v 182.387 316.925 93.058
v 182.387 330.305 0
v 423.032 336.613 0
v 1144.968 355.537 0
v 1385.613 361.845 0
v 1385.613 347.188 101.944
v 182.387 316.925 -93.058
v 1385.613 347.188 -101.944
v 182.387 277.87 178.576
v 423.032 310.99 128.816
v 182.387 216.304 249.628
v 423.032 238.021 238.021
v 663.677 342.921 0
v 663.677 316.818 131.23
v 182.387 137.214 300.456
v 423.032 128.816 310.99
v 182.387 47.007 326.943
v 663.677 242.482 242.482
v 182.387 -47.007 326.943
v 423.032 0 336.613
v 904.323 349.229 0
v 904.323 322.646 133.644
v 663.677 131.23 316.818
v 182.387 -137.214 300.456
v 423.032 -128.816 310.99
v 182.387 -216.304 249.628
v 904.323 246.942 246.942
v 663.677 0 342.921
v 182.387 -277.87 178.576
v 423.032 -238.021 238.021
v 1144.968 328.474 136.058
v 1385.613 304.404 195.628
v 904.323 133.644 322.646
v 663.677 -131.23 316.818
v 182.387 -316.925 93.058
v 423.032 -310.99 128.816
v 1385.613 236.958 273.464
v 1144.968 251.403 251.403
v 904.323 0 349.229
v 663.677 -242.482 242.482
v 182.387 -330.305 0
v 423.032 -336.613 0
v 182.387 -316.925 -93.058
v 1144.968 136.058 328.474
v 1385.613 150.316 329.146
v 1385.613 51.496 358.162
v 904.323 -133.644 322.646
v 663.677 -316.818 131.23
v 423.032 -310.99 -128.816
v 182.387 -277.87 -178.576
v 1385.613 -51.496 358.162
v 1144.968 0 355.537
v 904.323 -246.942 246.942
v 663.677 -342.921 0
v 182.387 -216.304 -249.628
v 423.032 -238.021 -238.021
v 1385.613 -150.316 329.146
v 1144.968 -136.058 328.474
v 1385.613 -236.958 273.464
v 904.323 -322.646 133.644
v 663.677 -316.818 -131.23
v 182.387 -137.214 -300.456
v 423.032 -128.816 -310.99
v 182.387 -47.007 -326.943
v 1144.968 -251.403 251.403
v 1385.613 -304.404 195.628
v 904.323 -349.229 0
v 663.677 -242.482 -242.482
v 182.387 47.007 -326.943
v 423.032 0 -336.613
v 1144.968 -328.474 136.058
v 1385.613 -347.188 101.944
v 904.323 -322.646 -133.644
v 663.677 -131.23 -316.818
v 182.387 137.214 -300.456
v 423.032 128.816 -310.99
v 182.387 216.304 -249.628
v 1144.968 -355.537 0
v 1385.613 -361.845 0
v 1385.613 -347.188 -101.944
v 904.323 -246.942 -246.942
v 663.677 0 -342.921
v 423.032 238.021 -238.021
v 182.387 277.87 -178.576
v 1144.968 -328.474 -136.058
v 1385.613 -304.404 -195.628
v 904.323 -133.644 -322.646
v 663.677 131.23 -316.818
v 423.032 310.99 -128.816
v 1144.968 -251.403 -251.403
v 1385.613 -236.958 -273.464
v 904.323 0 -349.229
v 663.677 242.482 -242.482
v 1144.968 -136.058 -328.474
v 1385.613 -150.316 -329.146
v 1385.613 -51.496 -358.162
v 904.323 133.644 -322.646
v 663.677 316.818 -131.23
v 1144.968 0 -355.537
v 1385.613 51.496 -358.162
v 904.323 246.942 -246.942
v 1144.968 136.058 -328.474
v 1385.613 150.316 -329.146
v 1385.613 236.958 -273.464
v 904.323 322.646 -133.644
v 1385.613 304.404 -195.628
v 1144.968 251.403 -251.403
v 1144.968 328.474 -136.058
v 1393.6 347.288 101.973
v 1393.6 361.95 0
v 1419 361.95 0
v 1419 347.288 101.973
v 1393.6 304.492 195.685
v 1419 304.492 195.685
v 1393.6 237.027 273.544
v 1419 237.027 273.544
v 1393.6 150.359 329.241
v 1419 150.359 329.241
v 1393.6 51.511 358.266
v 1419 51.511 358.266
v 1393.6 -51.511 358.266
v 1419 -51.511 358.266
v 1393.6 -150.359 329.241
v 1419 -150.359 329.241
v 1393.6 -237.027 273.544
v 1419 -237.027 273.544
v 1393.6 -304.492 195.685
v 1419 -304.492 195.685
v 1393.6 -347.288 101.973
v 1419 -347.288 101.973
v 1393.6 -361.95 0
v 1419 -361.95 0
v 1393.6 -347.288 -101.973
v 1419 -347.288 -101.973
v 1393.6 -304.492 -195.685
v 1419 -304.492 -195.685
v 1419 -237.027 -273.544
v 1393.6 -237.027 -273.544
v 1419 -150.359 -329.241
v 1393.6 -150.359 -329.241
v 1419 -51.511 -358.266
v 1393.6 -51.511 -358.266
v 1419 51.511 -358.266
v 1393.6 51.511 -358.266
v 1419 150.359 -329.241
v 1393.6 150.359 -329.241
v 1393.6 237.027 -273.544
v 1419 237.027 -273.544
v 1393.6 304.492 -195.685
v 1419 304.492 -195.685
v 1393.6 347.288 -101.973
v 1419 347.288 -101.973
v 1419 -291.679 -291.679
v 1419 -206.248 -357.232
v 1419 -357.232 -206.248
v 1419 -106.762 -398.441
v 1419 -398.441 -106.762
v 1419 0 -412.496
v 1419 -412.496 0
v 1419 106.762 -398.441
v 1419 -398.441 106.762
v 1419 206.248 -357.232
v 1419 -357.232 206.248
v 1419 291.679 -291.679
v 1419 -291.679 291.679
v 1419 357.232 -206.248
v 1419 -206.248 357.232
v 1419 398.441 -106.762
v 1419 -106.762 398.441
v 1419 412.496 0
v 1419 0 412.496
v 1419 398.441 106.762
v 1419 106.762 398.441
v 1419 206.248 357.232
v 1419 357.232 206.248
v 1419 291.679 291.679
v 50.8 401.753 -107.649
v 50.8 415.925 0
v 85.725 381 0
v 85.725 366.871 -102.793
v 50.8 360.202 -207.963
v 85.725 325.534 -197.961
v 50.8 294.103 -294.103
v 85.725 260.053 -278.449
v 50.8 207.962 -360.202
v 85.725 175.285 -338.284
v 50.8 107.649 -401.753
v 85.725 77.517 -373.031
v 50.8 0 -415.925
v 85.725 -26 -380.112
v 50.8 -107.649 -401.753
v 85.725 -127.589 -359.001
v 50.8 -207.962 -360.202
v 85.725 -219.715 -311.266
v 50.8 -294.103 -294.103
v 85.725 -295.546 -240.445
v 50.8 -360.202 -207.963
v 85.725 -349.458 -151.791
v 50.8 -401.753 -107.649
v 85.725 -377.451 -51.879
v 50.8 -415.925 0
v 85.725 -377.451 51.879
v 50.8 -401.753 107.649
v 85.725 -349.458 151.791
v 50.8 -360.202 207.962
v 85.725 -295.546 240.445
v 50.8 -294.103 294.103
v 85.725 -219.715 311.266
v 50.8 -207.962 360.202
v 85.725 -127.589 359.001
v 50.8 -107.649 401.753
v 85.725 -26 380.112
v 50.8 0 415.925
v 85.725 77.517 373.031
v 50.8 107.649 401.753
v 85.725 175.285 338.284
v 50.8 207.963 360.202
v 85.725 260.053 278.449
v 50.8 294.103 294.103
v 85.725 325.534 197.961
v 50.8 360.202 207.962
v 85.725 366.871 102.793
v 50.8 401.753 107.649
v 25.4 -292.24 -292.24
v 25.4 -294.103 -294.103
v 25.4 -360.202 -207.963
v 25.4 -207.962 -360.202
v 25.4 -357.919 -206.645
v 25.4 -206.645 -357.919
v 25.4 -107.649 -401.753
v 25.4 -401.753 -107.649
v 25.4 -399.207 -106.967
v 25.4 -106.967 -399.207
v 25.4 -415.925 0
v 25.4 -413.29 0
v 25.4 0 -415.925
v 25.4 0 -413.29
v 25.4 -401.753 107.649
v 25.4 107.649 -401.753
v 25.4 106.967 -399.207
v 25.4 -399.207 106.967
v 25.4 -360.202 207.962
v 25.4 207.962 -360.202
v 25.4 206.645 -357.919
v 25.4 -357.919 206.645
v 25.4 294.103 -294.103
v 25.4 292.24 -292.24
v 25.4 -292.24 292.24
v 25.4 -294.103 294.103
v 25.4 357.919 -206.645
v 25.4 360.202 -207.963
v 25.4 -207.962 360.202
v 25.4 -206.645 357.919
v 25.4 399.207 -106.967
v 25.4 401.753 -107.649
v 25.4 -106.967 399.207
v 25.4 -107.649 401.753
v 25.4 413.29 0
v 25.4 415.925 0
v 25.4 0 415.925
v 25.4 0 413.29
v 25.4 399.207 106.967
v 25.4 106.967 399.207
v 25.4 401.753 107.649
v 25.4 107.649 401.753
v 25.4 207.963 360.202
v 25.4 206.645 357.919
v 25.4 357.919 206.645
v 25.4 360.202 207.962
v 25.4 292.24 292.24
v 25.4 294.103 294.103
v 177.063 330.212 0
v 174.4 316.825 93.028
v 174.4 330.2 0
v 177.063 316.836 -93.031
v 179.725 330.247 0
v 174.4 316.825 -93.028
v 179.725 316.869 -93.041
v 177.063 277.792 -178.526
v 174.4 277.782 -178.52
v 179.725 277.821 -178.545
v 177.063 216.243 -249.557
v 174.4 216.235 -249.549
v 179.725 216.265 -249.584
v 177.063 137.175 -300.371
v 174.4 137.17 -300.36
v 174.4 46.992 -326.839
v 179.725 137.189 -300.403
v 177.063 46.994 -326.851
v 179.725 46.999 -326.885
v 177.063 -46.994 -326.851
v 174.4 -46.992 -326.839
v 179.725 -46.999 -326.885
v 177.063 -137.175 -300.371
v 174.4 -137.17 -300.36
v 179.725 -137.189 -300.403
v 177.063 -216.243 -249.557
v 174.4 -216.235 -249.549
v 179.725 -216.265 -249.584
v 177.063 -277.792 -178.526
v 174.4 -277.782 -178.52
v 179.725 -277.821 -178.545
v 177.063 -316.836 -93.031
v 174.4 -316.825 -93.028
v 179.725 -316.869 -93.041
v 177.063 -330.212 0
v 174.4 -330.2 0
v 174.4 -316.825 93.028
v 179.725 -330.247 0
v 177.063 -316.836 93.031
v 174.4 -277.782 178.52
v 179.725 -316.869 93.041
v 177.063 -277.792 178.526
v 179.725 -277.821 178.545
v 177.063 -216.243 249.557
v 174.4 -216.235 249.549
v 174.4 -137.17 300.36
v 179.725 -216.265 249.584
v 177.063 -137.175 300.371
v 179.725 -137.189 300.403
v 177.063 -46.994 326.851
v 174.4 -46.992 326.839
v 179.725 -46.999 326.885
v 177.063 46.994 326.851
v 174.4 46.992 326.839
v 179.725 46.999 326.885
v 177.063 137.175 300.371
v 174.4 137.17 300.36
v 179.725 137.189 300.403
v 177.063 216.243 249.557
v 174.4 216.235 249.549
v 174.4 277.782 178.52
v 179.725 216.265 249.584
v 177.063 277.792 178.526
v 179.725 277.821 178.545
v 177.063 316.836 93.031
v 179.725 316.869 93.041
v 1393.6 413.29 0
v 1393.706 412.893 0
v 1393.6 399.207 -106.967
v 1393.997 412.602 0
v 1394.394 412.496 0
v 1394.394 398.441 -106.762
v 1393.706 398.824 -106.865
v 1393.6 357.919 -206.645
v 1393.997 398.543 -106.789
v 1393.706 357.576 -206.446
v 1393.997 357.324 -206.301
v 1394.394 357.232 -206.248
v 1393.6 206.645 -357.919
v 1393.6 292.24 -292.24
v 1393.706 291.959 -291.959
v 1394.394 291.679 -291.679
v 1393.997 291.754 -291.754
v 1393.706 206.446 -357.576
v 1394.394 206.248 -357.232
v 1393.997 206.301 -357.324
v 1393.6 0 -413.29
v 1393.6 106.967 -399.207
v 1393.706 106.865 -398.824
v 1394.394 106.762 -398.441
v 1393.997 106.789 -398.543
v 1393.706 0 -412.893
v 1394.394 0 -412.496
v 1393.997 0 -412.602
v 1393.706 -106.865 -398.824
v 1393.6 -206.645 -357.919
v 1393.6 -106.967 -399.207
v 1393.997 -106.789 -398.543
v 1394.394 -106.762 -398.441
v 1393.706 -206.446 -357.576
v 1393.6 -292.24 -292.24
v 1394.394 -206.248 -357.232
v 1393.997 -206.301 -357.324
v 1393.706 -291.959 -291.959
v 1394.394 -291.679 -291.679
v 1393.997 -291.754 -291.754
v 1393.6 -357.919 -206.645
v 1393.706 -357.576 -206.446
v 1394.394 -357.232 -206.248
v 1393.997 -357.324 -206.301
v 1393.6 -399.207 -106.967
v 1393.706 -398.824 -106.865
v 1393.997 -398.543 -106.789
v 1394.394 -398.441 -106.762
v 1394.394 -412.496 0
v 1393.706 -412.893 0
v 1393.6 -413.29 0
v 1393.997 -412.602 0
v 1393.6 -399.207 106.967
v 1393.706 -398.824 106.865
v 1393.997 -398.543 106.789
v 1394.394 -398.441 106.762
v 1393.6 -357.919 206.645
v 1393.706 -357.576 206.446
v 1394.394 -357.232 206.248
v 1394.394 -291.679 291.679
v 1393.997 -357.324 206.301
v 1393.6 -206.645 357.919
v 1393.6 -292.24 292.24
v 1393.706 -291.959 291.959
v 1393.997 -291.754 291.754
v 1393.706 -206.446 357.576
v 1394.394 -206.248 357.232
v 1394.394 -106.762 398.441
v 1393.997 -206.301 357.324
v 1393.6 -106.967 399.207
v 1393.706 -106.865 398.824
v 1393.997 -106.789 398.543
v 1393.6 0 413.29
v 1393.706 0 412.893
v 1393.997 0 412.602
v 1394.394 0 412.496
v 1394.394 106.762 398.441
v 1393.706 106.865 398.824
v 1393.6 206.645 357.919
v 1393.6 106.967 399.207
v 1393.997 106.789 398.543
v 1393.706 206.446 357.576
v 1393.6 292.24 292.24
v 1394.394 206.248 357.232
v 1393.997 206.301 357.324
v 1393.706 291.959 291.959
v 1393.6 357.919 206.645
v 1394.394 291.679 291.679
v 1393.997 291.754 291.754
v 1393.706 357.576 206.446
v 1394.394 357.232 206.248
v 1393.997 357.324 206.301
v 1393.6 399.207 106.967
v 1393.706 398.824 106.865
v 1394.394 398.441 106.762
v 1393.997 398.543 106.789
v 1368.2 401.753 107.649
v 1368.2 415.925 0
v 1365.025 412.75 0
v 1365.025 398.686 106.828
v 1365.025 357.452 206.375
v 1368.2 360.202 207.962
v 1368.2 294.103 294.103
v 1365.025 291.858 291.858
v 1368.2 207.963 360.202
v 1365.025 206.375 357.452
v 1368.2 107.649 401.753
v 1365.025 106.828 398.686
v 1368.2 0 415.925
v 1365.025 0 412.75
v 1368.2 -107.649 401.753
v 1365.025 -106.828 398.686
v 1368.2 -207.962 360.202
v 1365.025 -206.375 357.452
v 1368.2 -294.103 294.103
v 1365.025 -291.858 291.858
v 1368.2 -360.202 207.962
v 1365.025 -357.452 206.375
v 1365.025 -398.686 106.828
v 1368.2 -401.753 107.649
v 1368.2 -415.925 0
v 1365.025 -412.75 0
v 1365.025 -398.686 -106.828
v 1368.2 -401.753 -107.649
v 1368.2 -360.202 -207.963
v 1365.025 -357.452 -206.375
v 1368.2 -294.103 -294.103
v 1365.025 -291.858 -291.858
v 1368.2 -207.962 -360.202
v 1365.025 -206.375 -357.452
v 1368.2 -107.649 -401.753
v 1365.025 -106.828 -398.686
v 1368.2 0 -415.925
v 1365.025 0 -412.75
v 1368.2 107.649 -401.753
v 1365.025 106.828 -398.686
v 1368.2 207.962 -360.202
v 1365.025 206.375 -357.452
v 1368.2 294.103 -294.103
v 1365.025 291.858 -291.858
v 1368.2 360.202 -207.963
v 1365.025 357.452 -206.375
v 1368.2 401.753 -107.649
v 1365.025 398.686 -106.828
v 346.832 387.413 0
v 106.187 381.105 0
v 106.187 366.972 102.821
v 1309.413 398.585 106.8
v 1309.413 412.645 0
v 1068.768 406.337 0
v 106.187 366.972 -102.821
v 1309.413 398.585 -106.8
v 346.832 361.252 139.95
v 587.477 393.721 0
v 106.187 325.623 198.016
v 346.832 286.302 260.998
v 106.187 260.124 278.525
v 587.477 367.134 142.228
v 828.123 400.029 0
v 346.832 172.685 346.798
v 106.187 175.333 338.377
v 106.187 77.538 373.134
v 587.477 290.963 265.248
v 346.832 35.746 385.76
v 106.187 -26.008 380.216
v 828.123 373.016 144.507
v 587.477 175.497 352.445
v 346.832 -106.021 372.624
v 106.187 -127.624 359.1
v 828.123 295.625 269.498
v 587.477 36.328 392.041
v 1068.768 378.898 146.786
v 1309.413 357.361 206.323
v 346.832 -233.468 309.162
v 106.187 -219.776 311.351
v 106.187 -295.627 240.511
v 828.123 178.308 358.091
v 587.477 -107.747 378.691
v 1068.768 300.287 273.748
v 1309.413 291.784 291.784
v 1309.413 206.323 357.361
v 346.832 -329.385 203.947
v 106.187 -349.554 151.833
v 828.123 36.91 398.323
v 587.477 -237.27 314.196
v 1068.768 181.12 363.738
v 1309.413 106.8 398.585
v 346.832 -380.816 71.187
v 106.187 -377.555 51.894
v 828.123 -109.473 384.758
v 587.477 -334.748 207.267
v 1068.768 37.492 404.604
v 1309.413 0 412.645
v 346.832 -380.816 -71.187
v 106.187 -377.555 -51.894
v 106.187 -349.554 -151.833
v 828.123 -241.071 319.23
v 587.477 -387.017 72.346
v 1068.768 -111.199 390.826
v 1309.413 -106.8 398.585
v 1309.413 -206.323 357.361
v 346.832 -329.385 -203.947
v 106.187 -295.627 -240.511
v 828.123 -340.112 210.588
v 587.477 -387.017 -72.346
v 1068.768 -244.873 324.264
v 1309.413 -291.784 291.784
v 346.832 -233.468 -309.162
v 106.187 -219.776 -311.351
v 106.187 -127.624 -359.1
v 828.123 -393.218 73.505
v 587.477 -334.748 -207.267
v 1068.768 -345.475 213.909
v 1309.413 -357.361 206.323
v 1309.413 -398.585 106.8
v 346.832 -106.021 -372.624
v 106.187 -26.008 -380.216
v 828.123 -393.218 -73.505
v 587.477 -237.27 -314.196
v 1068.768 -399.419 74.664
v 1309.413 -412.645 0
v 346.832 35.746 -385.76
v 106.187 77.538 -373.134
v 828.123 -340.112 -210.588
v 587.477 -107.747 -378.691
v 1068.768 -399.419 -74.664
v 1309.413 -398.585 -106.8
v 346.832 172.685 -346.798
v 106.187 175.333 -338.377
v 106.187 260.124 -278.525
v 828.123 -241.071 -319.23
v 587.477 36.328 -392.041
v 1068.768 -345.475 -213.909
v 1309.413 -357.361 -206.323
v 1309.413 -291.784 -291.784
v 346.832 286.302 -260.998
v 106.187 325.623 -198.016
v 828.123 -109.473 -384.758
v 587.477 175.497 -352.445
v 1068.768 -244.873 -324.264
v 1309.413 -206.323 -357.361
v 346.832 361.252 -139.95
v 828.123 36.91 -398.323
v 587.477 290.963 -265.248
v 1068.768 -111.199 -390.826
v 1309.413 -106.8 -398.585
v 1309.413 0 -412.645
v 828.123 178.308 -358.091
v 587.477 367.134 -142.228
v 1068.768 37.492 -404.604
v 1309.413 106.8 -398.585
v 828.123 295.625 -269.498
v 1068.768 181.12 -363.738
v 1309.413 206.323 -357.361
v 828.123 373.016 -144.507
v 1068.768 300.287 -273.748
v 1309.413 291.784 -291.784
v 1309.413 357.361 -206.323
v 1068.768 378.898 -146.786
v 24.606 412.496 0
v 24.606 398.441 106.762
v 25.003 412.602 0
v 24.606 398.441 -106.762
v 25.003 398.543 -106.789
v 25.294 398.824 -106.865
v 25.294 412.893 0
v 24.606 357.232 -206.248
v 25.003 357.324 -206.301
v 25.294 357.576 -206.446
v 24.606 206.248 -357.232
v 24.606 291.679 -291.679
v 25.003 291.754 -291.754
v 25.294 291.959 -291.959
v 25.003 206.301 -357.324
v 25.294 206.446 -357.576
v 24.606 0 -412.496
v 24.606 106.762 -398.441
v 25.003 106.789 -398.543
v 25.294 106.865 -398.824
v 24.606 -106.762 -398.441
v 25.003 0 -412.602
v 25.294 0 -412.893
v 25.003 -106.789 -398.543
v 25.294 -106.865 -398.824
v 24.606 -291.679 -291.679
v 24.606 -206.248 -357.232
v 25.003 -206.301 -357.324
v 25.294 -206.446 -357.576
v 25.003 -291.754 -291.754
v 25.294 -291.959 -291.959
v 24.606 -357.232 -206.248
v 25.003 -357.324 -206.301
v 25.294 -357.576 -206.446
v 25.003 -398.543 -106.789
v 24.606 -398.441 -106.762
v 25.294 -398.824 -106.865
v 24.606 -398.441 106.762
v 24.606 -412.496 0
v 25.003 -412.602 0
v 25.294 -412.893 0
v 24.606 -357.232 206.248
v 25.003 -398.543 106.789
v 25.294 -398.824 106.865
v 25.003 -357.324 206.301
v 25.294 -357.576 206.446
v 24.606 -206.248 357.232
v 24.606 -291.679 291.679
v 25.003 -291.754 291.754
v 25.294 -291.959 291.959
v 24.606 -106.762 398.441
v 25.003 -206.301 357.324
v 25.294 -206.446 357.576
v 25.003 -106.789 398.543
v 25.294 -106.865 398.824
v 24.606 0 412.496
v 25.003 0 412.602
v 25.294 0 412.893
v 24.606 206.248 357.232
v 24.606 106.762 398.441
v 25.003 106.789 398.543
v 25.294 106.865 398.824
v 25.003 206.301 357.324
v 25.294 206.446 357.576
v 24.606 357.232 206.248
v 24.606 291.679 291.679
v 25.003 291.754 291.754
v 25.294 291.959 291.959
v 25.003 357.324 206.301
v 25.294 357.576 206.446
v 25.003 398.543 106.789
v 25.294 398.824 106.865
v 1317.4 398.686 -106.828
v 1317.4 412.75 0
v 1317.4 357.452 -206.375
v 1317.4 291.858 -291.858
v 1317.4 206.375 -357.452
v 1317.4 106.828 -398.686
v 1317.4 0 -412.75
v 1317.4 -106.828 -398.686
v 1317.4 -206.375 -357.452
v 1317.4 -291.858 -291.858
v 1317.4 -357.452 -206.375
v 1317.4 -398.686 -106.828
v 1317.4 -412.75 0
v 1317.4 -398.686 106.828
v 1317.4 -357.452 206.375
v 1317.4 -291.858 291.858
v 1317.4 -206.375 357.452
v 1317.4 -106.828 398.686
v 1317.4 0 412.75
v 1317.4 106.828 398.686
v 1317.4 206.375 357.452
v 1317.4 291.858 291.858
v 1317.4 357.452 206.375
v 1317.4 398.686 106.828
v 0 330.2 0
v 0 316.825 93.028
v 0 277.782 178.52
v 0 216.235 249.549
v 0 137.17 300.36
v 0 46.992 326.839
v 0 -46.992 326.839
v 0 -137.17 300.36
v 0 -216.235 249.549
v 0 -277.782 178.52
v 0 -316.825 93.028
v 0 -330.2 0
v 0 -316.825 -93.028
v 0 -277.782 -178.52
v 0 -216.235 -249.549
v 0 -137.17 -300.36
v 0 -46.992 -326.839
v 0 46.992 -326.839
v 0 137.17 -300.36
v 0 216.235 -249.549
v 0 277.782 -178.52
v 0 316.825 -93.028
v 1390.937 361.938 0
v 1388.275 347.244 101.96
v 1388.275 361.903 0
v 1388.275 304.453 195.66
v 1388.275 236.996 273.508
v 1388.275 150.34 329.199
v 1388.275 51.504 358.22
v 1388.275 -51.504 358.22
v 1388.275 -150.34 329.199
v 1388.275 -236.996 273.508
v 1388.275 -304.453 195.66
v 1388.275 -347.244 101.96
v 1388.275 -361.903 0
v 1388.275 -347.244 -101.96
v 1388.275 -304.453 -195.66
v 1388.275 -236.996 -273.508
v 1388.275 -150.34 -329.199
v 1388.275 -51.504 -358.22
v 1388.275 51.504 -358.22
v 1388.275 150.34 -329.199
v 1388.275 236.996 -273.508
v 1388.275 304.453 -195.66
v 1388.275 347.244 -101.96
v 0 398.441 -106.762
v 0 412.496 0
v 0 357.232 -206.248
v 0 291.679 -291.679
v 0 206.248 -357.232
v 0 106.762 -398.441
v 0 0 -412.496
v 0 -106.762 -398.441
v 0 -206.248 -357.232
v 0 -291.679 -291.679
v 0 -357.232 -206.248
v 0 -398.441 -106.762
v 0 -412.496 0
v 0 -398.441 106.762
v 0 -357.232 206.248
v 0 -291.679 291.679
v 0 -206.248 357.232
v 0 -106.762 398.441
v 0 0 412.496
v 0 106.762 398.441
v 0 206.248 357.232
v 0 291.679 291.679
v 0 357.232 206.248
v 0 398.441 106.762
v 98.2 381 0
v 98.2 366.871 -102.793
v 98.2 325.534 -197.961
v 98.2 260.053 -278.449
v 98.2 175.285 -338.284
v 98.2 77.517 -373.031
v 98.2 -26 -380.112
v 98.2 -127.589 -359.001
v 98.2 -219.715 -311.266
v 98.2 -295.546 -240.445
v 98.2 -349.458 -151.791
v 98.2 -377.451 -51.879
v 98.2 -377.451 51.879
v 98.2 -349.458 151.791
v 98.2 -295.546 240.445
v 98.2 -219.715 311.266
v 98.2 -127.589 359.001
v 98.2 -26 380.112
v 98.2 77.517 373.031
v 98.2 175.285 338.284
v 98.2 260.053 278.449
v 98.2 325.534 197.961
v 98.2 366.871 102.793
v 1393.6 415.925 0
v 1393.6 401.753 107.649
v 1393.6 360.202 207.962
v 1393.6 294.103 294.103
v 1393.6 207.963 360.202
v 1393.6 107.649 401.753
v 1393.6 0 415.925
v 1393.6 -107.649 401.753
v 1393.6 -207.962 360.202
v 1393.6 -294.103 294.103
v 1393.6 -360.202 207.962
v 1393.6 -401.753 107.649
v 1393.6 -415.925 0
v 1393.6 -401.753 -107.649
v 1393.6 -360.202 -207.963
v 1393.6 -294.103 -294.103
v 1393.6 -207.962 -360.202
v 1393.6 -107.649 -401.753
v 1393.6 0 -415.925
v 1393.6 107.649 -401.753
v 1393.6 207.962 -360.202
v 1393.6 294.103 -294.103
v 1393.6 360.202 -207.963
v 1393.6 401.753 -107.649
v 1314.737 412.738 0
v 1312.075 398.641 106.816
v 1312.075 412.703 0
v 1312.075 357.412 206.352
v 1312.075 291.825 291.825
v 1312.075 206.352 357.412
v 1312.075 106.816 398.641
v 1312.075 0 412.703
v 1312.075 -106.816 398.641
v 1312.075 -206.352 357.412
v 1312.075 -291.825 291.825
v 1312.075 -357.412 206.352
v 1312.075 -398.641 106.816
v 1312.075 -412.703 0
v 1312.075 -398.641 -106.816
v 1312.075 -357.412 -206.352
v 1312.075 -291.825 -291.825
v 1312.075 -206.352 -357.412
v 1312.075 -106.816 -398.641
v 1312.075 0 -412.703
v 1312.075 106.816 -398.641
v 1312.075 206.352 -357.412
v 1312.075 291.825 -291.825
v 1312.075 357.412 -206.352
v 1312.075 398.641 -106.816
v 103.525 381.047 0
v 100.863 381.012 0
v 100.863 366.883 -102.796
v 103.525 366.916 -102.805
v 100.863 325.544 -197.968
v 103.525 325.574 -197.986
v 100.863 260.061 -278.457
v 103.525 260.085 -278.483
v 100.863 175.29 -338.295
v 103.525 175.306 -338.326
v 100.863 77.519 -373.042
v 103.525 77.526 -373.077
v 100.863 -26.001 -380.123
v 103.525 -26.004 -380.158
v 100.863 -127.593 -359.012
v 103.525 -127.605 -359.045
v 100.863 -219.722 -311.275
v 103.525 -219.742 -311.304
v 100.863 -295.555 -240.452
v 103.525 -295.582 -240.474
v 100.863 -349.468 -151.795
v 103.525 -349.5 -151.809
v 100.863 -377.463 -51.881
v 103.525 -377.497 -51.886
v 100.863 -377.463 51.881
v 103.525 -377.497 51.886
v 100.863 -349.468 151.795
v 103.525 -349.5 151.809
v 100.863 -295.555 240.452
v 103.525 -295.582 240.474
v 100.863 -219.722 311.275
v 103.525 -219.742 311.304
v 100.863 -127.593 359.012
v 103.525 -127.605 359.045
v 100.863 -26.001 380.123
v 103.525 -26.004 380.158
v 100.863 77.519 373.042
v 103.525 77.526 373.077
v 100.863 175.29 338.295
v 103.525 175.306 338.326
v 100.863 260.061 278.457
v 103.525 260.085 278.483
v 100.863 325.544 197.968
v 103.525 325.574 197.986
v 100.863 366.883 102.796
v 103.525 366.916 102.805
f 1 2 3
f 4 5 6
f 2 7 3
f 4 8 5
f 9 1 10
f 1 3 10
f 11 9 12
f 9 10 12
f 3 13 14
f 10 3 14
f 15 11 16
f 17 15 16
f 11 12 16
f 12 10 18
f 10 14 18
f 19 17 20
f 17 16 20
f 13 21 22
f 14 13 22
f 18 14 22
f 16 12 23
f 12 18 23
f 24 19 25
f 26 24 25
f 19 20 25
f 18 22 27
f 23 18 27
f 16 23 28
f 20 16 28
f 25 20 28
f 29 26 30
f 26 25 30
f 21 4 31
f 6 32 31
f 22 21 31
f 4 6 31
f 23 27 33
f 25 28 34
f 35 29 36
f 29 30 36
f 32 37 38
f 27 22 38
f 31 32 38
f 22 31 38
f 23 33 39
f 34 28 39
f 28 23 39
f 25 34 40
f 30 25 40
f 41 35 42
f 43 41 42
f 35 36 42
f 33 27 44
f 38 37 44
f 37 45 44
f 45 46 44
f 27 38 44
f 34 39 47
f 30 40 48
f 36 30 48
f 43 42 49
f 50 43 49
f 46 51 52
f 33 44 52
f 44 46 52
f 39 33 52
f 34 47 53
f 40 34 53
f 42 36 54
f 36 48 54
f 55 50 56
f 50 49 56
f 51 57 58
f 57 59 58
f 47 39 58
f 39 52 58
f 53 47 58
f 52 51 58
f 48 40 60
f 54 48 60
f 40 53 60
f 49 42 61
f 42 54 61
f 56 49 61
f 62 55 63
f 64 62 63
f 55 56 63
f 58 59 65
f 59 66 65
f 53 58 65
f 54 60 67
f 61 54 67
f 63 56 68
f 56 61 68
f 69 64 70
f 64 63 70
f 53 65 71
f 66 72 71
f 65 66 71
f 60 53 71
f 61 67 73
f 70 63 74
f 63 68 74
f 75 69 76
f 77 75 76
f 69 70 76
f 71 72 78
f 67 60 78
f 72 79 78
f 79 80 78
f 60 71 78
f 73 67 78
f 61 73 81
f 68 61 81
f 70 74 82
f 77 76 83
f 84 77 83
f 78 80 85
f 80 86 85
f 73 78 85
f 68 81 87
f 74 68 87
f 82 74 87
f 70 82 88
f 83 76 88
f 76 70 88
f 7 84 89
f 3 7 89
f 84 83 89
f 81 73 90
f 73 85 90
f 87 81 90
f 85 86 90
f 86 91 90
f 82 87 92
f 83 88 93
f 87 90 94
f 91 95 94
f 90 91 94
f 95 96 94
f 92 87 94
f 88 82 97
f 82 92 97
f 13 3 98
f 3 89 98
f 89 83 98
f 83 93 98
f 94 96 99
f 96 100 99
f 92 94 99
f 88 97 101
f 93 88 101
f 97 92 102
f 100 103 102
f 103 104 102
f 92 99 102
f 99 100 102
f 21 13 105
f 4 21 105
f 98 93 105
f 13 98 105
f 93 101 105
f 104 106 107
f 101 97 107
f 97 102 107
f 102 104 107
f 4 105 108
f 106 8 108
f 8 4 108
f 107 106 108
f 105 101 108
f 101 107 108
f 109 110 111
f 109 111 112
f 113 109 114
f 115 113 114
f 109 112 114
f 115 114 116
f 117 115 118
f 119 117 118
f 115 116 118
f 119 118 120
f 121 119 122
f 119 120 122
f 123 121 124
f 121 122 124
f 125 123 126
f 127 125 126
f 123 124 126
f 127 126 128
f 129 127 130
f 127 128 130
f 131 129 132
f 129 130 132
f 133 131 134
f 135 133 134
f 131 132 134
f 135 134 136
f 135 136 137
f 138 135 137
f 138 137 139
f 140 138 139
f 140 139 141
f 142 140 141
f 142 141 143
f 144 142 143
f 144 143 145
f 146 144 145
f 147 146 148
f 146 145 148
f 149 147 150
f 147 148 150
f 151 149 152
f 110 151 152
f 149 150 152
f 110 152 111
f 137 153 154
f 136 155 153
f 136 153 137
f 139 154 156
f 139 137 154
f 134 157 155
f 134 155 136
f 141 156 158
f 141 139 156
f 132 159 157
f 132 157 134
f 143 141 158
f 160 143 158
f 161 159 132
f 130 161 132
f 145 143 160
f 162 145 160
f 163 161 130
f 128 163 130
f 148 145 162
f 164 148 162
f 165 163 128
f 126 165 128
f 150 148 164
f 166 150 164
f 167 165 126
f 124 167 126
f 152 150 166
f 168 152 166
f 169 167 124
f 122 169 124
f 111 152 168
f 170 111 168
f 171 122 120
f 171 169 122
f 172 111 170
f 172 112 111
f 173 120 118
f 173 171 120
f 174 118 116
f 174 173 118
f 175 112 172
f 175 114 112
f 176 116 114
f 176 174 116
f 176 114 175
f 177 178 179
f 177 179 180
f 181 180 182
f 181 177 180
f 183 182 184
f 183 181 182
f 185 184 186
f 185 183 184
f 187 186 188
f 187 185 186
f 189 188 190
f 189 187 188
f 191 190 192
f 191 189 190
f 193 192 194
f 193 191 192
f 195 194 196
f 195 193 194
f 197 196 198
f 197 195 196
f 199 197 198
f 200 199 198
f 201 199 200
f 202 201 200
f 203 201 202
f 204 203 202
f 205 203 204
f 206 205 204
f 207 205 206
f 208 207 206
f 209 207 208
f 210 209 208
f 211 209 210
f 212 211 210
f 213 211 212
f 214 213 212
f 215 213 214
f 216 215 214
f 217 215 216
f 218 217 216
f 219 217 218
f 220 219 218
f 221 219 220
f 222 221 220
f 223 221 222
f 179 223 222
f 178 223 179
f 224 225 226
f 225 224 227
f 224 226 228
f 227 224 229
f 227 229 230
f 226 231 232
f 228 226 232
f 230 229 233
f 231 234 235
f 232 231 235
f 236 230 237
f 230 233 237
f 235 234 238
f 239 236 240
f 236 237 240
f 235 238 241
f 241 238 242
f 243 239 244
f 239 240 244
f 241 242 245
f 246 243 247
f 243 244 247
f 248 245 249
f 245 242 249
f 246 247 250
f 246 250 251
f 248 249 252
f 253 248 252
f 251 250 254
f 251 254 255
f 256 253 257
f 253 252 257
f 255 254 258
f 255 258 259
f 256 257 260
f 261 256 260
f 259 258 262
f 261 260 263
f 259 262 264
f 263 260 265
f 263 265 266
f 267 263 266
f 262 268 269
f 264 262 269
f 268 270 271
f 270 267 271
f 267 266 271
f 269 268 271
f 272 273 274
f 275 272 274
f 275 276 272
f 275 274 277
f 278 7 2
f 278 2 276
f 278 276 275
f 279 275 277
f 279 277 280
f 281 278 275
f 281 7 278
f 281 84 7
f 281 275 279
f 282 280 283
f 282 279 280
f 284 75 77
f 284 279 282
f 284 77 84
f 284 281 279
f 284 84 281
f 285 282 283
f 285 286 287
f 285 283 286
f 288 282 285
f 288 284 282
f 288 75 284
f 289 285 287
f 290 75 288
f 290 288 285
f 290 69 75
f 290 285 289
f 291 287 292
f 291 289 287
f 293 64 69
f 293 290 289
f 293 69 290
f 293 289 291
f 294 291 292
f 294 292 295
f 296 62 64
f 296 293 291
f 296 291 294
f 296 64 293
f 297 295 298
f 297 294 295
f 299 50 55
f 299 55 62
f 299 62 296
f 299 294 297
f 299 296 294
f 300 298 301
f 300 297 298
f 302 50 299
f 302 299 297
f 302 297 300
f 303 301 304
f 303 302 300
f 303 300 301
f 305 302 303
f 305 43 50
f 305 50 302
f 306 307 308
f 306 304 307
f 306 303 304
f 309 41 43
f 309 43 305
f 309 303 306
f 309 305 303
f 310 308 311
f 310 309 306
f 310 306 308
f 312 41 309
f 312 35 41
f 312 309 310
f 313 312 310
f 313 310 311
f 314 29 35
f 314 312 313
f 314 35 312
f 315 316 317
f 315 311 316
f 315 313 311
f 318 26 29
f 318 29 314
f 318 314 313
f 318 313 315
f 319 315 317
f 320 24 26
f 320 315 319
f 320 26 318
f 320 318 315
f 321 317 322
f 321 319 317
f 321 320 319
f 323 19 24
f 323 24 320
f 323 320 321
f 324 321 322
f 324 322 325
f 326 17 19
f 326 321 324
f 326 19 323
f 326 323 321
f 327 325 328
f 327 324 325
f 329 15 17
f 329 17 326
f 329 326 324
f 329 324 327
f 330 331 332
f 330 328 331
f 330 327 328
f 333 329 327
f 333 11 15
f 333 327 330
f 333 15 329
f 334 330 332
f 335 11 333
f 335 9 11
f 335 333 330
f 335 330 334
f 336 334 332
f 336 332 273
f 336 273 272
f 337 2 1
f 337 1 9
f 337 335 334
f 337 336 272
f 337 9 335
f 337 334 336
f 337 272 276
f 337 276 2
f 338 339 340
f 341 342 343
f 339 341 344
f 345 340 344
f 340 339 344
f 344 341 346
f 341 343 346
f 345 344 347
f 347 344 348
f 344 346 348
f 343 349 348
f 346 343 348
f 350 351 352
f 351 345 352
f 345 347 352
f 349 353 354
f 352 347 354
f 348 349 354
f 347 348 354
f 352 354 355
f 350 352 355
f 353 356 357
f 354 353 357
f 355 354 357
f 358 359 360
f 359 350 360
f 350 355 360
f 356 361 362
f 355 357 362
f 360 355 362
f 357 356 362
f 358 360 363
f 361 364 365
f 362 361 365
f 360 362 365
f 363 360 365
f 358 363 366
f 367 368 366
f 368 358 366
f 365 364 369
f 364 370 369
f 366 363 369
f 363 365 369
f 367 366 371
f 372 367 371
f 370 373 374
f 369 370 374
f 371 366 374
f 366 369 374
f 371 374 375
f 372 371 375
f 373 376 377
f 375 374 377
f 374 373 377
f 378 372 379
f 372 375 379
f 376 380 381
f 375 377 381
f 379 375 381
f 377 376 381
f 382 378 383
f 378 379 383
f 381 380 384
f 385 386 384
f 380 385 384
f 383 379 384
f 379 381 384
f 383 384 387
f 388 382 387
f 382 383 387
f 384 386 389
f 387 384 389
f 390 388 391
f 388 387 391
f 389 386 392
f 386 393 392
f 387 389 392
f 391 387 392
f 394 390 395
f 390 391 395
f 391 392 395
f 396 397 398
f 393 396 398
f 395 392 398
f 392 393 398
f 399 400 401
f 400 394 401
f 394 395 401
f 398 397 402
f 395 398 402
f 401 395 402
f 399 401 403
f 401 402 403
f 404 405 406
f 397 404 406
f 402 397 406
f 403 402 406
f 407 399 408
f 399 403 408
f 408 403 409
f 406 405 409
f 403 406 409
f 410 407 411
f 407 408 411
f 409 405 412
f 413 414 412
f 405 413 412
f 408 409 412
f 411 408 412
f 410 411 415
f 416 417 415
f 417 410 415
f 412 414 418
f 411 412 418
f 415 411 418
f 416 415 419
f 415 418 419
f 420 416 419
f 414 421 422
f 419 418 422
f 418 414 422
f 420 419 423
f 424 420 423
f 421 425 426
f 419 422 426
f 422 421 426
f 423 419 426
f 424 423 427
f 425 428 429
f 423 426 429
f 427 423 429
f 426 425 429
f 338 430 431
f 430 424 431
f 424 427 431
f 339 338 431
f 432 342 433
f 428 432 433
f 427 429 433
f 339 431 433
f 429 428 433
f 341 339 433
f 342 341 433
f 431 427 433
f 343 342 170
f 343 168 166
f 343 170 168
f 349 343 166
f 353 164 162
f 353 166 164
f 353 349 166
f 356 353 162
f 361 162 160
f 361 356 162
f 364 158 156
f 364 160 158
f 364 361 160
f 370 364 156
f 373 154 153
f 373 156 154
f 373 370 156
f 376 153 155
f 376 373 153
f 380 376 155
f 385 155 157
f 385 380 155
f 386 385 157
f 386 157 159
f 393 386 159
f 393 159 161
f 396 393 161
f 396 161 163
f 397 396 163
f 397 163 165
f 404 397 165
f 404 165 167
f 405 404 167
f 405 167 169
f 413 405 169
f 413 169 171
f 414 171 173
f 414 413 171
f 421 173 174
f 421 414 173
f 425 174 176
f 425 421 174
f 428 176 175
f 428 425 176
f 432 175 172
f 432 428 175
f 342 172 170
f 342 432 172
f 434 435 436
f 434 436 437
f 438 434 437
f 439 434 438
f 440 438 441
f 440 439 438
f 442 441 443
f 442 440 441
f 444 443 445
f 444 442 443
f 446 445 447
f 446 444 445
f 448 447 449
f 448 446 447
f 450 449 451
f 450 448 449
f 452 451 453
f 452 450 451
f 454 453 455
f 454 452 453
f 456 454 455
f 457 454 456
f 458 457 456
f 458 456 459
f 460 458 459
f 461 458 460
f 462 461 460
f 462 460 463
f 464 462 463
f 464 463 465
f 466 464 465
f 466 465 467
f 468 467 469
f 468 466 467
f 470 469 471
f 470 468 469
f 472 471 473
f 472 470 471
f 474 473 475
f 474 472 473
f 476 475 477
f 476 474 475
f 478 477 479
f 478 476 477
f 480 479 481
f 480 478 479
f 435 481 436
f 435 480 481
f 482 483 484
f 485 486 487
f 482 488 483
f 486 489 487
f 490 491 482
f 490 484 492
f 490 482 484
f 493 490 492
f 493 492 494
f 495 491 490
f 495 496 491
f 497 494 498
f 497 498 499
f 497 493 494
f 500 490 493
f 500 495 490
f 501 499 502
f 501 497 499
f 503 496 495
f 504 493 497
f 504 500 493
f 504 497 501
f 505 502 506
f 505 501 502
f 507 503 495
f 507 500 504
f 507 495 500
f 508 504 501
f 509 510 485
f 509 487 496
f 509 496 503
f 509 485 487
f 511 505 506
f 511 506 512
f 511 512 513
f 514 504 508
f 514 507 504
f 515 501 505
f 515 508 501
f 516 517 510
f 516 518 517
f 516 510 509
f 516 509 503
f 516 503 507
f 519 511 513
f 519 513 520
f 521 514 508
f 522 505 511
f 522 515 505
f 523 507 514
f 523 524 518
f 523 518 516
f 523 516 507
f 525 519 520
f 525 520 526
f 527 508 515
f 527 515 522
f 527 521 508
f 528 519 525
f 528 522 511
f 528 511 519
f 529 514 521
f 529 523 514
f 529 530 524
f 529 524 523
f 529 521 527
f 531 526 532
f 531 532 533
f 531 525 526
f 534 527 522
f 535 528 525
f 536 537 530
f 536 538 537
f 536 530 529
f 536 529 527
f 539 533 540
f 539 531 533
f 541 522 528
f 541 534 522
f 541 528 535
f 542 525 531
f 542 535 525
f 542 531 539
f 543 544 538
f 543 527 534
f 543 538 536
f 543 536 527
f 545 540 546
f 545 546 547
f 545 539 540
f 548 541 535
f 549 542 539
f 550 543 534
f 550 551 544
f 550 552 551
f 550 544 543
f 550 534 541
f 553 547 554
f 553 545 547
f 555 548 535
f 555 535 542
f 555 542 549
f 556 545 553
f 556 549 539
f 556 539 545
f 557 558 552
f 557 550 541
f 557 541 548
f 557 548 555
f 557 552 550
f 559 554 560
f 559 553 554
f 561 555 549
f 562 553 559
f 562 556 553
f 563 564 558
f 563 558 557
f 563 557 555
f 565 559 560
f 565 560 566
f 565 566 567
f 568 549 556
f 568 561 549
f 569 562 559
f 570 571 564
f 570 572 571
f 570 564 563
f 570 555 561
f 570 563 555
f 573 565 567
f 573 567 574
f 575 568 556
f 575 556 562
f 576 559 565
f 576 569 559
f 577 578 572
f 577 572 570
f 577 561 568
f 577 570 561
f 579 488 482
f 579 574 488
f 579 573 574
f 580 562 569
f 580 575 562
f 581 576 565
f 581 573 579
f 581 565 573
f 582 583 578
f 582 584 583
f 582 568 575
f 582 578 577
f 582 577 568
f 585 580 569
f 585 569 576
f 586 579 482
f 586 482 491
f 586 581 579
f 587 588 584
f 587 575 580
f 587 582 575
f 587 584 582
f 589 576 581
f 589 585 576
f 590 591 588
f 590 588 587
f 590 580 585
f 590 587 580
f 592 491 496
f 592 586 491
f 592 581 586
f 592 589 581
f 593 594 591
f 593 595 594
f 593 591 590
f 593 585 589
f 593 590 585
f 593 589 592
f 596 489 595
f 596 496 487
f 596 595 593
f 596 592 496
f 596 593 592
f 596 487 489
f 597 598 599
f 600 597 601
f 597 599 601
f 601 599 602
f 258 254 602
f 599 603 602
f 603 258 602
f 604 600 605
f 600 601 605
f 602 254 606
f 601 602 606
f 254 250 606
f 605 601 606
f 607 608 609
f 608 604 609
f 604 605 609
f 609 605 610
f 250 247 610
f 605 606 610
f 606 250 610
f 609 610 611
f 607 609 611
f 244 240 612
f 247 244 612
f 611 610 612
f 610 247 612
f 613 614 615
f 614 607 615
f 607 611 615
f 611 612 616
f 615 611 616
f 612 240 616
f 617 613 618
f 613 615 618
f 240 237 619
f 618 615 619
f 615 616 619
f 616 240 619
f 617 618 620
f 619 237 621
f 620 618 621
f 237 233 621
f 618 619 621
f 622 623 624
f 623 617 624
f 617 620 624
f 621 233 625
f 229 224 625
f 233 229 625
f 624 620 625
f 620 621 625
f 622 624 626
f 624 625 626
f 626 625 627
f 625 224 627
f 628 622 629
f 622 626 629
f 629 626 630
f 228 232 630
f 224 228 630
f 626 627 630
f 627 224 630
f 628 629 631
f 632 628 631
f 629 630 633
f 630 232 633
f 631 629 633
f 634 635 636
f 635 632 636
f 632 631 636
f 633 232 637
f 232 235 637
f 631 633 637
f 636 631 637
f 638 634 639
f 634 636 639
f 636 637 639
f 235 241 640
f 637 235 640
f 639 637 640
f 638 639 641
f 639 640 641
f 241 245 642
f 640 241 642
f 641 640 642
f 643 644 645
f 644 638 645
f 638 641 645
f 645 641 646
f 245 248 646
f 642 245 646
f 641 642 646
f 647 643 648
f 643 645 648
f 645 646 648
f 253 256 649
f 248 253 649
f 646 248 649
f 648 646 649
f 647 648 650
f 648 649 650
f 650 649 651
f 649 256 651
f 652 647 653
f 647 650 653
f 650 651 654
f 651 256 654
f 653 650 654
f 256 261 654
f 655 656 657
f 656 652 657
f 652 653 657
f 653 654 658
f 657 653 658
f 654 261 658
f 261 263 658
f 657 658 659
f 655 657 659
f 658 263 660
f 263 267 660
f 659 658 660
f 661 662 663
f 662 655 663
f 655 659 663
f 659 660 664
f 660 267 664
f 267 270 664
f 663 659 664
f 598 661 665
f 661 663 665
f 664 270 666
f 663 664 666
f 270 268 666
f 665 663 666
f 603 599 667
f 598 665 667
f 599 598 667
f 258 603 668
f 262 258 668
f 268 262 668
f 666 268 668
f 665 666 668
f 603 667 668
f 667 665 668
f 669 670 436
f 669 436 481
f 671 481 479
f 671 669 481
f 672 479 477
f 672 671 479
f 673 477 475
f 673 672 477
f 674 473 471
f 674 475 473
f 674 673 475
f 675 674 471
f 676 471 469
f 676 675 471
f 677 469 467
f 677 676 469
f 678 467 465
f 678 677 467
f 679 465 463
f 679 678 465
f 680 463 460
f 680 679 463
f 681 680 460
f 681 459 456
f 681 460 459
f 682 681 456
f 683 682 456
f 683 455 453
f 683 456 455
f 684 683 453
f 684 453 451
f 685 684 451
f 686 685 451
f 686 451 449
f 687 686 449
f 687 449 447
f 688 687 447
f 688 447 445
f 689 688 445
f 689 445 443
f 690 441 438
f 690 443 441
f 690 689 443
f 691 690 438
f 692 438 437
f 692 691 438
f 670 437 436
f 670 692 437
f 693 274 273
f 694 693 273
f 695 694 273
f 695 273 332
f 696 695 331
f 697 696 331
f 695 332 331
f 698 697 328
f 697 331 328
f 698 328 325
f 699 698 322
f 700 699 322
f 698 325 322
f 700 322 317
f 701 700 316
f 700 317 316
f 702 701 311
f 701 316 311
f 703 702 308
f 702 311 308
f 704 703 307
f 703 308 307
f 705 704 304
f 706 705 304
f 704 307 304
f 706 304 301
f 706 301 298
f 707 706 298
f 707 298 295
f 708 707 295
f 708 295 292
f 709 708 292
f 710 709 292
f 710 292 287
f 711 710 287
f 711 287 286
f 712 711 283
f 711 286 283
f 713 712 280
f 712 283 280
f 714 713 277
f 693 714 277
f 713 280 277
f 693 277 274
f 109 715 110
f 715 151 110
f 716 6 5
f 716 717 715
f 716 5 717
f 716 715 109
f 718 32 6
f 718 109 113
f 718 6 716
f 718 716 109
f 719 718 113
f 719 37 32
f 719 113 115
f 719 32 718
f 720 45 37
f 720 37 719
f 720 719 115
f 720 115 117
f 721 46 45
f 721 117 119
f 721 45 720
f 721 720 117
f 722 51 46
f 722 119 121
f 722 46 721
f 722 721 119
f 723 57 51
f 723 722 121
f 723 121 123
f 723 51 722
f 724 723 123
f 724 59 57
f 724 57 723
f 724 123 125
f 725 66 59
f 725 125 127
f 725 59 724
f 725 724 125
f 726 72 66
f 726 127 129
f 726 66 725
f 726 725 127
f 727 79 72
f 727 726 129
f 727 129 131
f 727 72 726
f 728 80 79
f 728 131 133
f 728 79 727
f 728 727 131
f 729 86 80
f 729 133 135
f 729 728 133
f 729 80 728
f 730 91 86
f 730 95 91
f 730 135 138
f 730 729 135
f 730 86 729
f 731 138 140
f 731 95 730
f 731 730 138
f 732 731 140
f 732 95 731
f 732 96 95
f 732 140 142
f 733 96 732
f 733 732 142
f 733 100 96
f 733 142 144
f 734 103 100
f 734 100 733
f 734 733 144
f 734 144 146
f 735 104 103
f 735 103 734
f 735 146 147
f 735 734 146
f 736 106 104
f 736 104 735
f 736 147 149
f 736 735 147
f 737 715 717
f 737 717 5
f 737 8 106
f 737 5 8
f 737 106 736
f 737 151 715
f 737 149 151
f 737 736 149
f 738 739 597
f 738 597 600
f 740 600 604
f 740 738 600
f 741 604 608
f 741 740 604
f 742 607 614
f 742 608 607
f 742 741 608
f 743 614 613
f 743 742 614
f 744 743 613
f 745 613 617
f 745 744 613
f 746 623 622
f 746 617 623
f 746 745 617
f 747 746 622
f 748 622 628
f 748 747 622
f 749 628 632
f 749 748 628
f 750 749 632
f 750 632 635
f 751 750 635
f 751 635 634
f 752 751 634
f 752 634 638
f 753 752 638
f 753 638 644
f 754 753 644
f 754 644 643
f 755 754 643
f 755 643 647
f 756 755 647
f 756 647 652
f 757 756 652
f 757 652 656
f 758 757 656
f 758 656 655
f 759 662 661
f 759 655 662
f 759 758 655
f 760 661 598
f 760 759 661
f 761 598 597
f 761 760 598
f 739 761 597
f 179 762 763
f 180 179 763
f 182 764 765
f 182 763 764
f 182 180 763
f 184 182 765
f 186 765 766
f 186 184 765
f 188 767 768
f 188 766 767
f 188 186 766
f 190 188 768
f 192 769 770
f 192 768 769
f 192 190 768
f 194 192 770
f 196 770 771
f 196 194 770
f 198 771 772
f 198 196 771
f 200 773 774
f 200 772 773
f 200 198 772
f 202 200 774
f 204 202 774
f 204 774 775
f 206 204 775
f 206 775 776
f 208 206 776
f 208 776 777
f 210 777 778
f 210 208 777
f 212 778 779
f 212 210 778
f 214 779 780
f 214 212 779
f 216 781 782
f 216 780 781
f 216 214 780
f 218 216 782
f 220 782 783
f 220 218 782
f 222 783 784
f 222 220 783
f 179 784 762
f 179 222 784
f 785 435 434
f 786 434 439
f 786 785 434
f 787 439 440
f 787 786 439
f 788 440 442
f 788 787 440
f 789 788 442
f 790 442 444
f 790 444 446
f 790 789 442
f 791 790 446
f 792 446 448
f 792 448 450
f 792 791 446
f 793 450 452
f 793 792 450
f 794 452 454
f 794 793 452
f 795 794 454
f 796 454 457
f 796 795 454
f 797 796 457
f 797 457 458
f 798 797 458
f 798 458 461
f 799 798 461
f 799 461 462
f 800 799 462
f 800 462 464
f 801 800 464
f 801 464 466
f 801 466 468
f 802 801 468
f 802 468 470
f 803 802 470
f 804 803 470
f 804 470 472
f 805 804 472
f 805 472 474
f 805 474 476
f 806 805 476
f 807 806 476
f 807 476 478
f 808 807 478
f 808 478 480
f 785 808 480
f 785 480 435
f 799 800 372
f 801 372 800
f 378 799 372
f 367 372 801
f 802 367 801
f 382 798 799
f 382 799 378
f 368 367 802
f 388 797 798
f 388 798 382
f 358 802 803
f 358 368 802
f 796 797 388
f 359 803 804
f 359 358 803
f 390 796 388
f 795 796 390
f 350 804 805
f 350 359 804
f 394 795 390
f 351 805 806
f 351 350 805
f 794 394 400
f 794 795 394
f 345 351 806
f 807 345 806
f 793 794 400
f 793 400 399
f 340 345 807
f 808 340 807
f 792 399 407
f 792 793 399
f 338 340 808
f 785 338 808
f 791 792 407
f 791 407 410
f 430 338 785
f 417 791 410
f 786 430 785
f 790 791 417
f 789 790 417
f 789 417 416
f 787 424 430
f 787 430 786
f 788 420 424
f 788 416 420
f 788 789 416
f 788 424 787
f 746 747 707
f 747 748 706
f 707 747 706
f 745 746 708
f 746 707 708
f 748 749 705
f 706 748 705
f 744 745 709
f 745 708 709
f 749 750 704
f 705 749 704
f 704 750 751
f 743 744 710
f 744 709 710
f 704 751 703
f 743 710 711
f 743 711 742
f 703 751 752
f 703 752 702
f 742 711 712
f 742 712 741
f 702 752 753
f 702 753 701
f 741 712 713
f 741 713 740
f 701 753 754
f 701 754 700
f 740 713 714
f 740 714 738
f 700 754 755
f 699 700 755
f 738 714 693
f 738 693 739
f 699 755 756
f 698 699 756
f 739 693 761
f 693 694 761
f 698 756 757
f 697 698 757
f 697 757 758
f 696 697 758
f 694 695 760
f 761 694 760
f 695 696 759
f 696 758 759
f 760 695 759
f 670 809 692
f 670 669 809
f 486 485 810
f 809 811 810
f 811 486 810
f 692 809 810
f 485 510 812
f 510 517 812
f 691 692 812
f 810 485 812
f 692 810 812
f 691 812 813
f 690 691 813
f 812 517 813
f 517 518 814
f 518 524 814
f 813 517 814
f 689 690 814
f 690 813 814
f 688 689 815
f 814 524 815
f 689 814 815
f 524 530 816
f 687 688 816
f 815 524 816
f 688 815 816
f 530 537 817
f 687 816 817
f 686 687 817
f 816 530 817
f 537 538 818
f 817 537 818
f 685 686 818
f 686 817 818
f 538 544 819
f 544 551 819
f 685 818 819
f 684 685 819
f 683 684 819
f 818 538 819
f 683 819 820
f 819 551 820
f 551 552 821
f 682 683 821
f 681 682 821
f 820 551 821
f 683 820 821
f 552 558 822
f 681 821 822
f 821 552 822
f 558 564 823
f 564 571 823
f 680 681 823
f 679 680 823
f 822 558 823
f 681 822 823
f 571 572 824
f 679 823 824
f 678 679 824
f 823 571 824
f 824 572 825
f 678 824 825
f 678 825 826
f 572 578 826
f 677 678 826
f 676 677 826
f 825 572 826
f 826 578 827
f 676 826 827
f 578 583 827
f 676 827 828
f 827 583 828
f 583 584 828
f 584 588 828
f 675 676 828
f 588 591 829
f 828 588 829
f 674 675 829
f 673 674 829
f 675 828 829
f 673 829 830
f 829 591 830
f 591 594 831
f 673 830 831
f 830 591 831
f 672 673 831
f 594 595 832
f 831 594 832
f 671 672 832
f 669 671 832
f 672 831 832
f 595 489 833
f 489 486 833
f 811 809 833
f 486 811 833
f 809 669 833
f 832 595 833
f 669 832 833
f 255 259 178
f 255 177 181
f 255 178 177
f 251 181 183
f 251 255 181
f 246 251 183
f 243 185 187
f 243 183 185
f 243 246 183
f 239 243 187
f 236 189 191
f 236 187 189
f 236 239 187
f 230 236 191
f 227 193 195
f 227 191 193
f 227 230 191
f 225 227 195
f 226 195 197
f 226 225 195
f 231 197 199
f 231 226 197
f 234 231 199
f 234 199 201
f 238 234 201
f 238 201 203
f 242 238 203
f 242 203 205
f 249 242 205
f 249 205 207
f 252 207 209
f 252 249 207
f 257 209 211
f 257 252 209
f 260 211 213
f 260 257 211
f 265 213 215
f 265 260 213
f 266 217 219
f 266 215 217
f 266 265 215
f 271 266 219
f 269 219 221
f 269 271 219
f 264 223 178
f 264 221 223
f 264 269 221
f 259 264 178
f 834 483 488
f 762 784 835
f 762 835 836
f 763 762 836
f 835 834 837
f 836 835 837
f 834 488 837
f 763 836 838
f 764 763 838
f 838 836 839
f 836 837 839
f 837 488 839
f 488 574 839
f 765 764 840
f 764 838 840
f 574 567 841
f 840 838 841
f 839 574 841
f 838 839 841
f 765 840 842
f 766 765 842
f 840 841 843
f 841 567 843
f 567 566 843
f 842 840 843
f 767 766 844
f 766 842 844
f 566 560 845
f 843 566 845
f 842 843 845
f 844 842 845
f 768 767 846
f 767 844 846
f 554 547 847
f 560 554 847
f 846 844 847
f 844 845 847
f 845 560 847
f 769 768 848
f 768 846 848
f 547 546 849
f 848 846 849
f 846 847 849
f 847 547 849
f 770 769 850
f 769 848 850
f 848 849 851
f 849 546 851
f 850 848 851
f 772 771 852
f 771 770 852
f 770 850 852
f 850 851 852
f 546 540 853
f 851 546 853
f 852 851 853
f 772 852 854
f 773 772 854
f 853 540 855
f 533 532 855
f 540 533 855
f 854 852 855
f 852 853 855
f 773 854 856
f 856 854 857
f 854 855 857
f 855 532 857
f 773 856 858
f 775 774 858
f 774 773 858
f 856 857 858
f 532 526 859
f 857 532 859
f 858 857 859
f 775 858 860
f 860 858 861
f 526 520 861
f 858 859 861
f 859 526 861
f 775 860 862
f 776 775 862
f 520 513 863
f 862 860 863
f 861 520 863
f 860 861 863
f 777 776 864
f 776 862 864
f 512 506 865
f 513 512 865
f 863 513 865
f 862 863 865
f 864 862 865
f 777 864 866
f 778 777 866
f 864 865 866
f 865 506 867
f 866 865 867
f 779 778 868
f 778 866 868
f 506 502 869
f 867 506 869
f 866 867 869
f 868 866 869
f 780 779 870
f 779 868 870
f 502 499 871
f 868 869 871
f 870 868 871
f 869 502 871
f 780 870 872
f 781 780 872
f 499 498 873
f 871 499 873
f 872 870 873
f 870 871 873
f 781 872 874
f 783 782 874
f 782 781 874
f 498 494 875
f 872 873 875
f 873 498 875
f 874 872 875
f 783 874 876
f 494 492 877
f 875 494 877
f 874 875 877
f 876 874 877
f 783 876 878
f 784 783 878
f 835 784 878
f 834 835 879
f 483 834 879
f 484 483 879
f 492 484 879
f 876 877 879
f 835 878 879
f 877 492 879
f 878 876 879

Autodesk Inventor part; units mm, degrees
ref_plane "YZ Plane" through (0, 0, 0) normal (1, 0, 0) x (0, 1, 0)
ref_plane "XZ Plane" through (0, 0, 0) normal (0, 1, 0) x (-1, 0, 0)
ref_plane "XY Plane" through (0, 0, 0) normal (0, 0, 1) x (1, 0, 0)
sketch "Sketch1" plane through (0, 0, 0) normal (0, 0, 1) x (1, 0, 0)
  line L0 (0, 0) -> (1419, 0)
  line L1 (0, 330.2) -> (174.4, 330.2)
  arc A0 (174.4, 330.2) -> (182.3871, 330.3047) centre (174.4, 635) ccw
  line L2 (182.3871, 330.3047) -> (1385.6129, 361.8453)
  arc A1 (1393.6, 361.95) -> (1385.6129, 361.8453) centre (1393.6, 57.15) ccw
  line L3 (1393.6, 361.95) -> (1419, 361.95)
  line L4 (1419, 361.95) -> (1419, 412.496)
  line L5 (1419, 412.496) -> (1393.6, 412.496)
  line L6 (1393.6, 412.496) -> (1393.6, 415.925)
  line L7 (1365.025, 412.75) -> (1317.4, 412.75)
  arc A2 (1317.4, 412.75) -> (1309.4129, 412.6453) centre (1317.4, 107.95) ccw
  line L8 (1309.4129, 412.6453) -> (106.1871, 381.1047)
  arc A3 (98.2, 381) -> (106.1871, 381.1047) centre (98.2, 685.8) ccw
  line L9 (98.2, 381) -> (85.725, 381)
  line L10 (25.4, 415.925) -> (25.4, 412.496)
  line L11 (25.4, 412.496) -> (0, 412.496)
  line L12 (0, 412.496) -> (0, 330.2)
  line L13 (85.725, 381) -> (50.8, 415.925)
  line L14 (50.8, 415.925) -> (25.4, 415.925)
  line L15 (1365.025, 412.75) -> (1368.2, 415.925)
  line L16 (1368.2, 415.925) -> (1393.6, 415.925)
  dimension "d0" = 1419
  dimension "d1" = 660.4
  dimension "d2" = 723.9
  dimension "d3" = 824.992
  dimension "d4" = 50.8
  dimension "d5" = 25.4
  dimension "d6" = 25.4
  dimension "d7" = 824.992
  dimension "d8" = 762
  dimension "d9" = 25.4
  dimension "d10" = 101.6
  dimension "d11" = 304.8
  dimension "d12" = 304.8
  dimension "d13" = 1219.2
  dimension "d14" = 52.7793
  dimension "d17" = 25.4
  dimension "d18" = 45
  dimension "d19" = 831.85
  dimension "d23" = 25.4
  dimension "d24" = 45
  dimension "d25" = 831.85
revolve "Revolution1" add sketch "Sketch1" angle 360 about axis through (0, 0, 0) along (1, 0, 0)
fillet "Fillet1" radius 0.7937 2 edges at (1393.6, -412.496, 0) (25.4, -412.496, 0)
properties part number "A1-19027-200-04 HCWi reducer" material "Iron, HCWI"
